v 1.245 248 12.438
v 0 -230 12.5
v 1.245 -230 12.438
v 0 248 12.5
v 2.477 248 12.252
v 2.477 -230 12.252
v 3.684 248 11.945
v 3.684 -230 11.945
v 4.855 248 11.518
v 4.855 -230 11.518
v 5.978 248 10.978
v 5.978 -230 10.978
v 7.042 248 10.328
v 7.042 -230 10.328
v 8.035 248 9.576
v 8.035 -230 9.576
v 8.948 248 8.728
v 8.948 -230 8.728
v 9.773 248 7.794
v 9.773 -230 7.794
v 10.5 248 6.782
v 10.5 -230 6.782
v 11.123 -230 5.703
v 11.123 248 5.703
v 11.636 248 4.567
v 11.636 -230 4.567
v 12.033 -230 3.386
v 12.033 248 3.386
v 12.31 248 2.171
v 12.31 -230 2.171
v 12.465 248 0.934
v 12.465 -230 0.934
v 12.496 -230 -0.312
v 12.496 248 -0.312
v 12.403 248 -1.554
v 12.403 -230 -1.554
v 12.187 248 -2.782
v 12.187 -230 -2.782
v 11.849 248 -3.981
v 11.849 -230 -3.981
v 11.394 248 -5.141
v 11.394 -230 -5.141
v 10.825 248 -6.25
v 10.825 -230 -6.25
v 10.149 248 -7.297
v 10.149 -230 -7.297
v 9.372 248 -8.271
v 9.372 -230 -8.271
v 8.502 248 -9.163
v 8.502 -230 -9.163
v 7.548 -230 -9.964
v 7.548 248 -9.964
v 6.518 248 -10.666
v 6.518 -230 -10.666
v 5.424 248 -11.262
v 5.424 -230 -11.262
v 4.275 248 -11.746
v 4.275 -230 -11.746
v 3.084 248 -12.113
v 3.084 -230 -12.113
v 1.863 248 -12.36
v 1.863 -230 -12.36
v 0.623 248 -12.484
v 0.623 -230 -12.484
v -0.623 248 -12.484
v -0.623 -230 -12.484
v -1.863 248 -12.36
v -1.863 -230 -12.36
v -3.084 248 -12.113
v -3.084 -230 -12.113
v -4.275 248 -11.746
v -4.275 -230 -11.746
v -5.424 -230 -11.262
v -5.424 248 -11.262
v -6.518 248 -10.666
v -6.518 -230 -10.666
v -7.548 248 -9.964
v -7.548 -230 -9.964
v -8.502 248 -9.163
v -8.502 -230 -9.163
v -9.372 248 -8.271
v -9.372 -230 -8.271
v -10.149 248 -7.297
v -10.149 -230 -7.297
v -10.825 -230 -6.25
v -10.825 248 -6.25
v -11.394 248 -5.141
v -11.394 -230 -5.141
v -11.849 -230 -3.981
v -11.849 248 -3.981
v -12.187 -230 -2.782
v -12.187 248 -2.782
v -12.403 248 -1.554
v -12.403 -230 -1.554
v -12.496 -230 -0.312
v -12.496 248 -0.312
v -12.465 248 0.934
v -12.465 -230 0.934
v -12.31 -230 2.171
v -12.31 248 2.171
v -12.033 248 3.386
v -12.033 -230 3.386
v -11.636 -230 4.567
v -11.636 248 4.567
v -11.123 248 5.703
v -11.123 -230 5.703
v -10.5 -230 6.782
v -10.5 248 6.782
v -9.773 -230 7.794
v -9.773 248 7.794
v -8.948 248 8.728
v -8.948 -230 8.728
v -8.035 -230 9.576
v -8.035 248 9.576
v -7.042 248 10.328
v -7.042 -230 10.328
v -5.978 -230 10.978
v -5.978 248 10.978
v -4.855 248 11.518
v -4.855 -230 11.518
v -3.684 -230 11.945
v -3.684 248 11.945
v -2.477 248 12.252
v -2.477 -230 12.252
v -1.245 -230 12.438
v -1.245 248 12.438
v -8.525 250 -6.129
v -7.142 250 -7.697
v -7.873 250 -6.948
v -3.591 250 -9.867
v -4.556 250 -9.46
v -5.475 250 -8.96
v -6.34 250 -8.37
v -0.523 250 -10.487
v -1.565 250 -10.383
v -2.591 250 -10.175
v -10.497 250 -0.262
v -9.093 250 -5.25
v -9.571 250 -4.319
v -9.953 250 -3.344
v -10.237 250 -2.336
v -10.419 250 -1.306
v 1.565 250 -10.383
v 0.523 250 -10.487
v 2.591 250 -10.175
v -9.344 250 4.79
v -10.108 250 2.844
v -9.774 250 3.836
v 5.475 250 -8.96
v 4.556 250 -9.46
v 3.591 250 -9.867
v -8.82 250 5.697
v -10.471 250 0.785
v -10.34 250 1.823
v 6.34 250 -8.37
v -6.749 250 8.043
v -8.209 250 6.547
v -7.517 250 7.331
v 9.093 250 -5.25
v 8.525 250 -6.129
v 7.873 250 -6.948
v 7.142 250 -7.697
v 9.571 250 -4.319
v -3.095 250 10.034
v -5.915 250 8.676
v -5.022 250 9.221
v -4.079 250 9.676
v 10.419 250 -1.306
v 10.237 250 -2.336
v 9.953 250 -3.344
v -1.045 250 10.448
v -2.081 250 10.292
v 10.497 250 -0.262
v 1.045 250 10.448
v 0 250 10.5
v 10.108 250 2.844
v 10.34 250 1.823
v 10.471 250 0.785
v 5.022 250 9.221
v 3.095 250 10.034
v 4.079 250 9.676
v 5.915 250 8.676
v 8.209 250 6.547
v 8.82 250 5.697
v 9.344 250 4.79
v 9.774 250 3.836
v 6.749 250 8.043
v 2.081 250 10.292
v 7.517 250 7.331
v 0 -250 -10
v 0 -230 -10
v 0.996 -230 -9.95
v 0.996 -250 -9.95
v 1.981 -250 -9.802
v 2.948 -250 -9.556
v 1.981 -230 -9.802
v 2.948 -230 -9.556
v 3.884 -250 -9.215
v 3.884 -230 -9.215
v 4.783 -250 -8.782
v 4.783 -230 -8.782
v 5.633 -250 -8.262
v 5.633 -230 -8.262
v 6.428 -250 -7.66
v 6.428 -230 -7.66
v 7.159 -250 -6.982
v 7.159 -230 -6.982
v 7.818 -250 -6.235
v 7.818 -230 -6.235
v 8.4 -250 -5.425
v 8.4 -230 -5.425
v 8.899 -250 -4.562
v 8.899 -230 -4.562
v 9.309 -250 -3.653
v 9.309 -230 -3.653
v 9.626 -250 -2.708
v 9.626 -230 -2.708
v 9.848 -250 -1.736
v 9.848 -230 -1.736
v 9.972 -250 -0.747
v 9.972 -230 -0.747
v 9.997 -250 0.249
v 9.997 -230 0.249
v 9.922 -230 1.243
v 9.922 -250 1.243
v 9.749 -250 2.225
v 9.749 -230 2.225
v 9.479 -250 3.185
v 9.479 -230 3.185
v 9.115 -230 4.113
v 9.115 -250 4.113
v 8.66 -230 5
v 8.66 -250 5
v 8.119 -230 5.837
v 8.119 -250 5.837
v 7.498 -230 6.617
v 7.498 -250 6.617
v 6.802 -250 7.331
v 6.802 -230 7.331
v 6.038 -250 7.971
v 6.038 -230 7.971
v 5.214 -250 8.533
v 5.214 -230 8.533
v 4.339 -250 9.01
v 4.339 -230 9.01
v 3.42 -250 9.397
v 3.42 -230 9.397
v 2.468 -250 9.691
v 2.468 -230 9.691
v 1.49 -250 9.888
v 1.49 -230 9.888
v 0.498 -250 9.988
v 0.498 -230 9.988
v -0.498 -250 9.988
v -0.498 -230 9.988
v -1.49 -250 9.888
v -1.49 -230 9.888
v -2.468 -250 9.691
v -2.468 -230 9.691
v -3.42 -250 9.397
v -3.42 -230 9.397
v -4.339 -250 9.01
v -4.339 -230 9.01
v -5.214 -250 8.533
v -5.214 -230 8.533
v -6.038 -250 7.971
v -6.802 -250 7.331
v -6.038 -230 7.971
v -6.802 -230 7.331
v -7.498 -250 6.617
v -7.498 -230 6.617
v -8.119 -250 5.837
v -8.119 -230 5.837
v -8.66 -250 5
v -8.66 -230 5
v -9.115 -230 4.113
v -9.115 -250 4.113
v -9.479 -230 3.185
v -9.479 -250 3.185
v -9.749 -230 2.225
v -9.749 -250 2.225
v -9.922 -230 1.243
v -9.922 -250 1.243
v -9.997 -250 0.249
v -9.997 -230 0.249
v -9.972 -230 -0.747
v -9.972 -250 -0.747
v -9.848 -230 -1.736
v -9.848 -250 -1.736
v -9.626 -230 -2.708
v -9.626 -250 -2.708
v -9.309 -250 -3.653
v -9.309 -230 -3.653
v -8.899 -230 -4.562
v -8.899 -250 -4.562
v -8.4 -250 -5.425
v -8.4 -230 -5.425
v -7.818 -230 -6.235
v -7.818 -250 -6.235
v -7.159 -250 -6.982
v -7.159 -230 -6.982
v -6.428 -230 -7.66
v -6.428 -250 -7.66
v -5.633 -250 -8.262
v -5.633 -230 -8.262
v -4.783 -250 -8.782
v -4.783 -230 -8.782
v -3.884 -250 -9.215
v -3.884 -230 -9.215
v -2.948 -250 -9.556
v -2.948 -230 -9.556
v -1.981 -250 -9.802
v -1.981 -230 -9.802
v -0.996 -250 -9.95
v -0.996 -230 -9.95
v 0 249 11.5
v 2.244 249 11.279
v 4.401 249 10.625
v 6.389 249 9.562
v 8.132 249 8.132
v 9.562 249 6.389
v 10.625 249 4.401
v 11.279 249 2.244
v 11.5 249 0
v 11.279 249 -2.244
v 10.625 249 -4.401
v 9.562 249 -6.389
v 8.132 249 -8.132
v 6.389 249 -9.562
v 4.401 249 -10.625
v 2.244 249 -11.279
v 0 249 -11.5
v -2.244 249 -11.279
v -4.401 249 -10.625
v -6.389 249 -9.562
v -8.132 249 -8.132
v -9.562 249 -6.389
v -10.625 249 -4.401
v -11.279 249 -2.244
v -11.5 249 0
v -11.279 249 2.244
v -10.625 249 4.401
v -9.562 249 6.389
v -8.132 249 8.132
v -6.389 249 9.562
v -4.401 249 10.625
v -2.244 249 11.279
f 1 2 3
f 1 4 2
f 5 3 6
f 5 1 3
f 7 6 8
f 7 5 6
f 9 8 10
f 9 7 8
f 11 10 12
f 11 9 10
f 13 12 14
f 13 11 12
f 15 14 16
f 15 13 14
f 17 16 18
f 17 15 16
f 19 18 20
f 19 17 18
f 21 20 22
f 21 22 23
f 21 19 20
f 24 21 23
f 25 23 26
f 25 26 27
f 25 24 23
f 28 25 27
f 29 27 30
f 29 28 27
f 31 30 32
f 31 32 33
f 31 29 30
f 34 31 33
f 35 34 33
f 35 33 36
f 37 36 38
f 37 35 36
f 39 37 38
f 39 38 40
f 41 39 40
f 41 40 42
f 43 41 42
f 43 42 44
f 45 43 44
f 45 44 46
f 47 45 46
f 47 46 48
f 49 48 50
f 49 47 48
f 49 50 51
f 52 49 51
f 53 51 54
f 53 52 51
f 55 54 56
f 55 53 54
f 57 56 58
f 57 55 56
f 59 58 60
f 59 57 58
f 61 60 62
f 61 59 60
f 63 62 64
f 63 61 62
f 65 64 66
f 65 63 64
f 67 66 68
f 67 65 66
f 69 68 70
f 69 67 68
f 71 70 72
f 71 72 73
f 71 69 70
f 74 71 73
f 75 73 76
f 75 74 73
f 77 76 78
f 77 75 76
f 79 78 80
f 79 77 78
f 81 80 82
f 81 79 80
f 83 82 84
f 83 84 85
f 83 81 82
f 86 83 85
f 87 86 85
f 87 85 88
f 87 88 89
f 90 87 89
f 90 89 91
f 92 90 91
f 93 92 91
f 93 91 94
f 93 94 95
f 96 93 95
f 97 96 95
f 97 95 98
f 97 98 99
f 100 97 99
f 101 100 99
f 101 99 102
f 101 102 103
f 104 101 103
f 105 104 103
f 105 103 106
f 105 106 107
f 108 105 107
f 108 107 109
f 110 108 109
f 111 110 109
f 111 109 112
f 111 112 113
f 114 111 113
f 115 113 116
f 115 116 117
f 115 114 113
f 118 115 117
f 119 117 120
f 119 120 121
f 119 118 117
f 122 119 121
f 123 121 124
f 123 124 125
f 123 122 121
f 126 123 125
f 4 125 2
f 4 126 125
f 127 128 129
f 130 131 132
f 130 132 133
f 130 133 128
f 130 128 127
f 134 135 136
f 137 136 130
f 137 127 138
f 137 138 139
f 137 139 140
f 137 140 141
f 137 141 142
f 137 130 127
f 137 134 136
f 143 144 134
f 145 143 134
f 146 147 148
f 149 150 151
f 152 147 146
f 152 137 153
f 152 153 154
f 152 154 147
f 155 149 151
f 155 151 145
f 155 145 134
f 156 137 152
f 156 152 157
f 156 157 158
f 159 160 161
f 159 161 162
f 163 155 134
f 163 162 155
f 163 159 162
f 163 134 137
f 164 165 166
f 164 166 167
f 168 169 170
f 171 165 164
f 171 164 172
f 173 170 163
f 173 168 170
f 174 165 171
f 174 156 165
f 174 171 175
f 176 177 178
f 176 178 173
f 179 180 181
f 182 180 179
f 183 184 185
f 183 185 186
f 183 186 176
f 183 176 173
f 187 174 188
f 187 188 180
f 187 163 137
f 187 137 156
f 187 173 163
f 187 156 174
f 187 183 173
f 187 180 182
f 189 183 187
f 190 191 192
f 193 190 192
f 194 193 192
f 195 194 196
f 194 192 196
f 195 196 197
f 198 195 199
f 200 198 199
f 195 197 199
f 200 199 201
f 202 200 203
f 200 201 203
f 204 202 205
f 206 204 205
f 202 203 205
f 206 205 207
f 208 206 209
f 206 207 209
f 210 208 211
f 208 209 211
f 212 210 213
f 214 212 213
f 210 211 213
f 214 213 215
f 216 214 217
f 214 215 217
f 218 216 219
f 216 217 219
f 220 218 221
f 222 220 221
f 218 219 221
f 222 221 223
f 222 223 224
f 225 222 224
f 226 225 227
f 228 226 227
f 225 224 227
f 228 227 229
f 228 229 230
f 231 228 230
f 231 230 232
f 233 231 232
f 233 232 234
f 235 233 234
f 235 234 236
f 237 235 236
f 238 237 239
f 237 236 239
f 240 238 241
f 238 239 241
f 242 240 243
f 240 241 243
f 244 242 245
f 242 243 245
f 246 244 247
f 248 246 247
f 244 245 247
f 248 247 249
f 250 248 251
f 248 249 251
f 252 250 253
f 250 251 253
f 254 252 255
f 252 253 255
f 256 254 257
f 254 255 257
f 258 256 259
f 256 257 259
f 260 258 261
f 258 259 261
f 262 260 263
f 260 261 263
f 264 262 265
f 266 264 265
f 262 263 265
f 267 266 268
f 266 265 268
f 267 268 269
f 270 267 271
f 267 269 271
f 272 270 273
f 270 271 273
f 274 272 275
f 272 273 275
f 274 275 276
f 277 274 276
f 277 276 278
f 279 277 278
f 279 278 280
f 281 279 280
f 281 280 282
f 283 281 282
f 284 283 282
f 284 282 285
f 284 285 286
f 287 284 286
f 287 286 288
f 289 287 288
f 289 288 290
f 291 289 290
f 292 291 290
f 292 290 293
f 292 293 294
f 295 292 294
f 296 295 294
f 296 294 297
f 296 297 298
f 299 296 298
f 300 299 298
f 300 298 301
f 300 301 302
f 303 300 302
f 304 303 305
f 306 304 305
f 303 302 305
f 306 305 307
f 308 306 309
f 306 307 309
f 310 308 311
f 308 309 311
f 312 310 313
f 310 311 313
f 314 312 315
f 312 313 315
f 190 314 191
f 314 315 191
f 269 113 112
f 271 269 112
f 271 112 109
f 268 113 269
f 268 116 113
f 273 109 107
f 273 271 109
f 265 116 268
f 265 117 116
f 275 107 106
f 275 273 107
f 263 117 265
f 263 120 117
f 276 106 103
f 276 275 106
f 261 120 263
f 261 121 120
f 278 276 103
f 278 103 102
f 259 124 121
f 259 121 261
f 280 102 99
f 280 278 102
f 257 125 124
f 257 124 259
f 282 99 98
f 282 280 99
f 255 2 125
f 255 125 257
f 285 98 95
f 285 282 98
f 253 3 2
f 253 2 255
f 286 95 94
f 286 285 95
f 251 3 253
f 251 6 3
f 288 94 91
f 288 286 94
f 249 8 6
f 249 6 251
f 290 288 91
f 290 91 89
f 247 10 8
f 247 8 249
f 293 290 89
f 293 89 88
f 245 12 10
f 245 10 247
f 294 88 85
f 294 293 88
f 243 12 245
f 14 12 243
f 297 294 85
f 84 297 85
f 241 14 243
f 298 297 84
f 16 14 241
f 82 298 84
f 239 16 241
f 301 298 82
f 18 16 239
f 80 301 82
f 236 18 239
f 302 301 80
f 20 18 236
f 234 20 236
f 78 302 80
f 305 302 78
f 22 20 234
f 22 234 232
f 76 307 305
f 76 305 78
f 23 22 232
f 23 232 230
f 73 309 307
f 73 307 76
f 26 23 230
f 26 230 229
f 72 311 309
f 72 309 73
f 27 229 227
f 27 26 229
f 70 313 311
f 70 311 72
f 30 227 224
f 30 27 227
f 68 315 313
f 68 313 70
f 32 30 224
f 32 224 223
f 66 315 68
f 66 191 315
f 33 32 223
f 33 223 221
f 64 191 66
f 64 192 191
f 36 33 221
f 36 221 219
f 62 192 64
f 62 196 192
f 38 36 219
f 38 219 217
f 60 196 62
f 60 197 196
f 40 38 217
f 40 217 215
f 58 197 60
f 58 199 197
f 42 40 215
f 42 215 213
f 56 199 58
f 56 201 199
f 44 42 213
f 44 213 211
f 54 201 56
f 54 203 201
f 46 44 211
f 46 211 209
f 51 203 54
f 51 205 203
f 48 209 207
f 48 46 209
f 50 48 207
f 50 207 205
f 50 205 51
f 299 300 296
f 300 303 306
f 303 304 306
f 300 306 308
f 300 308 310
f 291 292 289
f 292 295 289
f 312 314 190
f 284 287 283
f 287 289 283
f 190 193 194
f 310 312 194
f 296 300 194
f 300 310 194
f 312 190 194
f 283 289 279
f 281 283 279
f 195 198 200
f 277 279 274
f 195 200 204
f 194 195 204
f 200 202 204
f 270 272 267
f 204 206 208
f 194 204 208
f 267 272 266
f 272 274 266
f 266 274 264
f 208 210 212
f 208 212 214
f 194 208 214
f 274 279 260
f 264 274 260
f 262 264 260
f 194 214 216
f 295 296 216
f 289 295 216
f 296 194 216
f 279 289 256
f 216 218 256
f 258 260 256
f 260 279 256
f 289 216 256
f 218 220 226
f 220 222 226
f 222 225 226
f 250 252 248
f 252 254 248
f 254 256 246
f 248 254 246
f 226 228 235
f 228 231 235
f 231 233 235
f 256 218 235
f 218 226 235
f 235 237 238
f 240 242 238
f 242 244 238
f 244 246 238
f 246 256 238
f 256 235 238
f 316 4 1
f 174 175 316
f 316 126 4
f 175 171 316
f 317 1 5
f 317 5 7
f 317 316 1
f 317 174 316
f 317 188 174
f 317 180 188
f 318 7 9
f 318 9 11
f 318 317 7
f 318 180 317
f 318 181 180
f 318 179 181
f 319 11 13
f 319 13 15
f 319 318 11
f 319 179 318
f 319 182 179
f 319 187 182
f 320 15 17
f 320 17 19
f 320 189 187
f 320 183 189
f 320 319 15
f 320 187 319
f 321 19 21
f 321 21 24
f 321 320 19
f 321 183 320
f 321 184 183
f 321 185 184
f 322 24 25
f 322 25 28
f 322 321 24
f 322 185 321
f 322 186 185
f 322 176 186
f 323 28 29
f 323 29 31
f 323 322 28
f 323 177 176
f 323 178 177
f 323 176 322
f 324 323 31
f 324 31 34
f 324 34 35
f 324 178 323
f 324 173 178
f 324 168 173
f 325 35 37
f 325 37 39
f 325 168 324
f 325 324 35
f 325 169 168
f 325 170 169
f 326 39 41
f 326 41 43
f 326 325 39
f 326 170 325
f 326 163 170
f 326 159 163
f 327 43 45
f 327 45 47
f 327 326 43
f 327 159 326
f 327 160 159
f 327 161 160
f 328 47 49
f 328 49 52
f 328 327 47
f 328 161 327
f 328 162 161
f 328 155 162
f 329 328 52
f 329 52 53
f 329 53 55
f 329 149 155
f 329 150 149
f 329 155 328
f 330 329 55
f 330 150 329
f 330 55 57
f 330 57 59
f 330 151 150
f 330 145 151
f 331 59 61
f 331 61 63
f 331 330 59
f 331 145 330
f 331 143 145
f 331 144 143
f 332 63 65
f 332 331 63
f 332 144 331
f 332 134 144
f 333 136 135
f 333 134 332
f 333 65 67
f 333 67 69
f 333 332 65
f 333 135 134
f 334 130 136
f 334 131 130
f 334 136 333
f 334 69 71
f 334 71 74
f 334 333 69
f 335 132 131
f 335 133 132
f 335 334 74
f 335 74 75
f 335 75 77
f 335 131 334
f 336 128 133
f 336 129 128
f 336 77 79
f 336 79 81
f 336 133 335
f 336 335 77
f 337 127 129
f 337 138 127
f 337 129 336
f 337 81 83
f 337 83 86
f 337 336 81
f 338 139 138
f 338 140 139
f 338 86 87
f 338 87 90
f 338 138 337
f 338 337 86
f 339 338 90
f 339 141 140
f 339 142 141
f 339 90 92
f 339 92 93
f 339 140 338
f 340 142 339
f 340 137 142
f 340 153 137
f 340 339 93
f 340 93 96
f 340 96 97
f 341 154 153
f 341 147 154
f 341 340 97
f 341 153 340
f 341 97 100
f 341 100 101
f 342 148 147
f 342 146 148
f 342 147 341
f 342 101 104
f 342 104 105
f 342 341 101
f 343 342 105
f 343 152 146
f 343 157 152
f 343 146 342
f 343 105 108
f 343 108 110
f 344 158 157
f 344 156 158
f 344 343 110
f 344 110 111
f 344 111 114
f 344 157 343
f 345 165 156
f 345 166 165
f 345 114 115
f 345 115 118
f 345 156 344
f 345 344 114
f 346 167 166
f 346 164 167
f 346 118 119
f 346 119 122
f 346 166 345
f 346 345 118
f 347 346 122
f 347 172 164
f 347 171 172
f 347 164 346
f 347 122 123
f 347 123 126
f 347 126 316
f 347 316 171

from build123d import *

# Parameters (mm, degrees)
SKETCH1_R           = 12.5
BOSS_EXTRUDE1_DEPTH = 250
CHAMFER1_SIZE       = 2
CUT_EXTRUDE1_START  = -20
SKETCH3_R           = 12.5
SKETCH3_R_2         = 10
CUT_EXTRUDE1_DEPTH  = 20


with BuildPart() as part:
    # Sketch1 → Boss-Extrude1 (new, symmetric)
    with BuildSketch(Plane(origin=(0, 0, 0), x_dir=(1, 0, 0), z_dir=(0, 1, 0))):
        with Locations(Location((0, 0, 0), (0, 0, 270))):
            Circle(SKETCH1_R)
    extrude(amount=BOSS_EXTRUDE1_DEPTH, both=True)

    # Chamfer1
    chamfer1_edges = [part.edges().sort_by_distance(p)[0] for p in [
        (0, 250, -12.5),
    ]]
    chamfer(chamfer1_edges, length=CHAMFER1_SIZE)

    # Sketch3 → Cut-Extrude1 (cut)
    with BuildSketch(Plane.XZ.offset(250).offset(CUT_EXTRUDE1_START)):
        with Locations(Location((0, 0, 0), (0, 0, 270))):
            Circle(SKETCH3_R)
        with Locations(Location((0, 0, 0), (0, 0, 270))):
            Circle(SKETCH3_R_2, mode=Mode.SUBTRACT)
    extrude(amount=CUT_EXTRUDE1_DEPTH, mode=Mode.SUBTRACT)


solid = part.part
